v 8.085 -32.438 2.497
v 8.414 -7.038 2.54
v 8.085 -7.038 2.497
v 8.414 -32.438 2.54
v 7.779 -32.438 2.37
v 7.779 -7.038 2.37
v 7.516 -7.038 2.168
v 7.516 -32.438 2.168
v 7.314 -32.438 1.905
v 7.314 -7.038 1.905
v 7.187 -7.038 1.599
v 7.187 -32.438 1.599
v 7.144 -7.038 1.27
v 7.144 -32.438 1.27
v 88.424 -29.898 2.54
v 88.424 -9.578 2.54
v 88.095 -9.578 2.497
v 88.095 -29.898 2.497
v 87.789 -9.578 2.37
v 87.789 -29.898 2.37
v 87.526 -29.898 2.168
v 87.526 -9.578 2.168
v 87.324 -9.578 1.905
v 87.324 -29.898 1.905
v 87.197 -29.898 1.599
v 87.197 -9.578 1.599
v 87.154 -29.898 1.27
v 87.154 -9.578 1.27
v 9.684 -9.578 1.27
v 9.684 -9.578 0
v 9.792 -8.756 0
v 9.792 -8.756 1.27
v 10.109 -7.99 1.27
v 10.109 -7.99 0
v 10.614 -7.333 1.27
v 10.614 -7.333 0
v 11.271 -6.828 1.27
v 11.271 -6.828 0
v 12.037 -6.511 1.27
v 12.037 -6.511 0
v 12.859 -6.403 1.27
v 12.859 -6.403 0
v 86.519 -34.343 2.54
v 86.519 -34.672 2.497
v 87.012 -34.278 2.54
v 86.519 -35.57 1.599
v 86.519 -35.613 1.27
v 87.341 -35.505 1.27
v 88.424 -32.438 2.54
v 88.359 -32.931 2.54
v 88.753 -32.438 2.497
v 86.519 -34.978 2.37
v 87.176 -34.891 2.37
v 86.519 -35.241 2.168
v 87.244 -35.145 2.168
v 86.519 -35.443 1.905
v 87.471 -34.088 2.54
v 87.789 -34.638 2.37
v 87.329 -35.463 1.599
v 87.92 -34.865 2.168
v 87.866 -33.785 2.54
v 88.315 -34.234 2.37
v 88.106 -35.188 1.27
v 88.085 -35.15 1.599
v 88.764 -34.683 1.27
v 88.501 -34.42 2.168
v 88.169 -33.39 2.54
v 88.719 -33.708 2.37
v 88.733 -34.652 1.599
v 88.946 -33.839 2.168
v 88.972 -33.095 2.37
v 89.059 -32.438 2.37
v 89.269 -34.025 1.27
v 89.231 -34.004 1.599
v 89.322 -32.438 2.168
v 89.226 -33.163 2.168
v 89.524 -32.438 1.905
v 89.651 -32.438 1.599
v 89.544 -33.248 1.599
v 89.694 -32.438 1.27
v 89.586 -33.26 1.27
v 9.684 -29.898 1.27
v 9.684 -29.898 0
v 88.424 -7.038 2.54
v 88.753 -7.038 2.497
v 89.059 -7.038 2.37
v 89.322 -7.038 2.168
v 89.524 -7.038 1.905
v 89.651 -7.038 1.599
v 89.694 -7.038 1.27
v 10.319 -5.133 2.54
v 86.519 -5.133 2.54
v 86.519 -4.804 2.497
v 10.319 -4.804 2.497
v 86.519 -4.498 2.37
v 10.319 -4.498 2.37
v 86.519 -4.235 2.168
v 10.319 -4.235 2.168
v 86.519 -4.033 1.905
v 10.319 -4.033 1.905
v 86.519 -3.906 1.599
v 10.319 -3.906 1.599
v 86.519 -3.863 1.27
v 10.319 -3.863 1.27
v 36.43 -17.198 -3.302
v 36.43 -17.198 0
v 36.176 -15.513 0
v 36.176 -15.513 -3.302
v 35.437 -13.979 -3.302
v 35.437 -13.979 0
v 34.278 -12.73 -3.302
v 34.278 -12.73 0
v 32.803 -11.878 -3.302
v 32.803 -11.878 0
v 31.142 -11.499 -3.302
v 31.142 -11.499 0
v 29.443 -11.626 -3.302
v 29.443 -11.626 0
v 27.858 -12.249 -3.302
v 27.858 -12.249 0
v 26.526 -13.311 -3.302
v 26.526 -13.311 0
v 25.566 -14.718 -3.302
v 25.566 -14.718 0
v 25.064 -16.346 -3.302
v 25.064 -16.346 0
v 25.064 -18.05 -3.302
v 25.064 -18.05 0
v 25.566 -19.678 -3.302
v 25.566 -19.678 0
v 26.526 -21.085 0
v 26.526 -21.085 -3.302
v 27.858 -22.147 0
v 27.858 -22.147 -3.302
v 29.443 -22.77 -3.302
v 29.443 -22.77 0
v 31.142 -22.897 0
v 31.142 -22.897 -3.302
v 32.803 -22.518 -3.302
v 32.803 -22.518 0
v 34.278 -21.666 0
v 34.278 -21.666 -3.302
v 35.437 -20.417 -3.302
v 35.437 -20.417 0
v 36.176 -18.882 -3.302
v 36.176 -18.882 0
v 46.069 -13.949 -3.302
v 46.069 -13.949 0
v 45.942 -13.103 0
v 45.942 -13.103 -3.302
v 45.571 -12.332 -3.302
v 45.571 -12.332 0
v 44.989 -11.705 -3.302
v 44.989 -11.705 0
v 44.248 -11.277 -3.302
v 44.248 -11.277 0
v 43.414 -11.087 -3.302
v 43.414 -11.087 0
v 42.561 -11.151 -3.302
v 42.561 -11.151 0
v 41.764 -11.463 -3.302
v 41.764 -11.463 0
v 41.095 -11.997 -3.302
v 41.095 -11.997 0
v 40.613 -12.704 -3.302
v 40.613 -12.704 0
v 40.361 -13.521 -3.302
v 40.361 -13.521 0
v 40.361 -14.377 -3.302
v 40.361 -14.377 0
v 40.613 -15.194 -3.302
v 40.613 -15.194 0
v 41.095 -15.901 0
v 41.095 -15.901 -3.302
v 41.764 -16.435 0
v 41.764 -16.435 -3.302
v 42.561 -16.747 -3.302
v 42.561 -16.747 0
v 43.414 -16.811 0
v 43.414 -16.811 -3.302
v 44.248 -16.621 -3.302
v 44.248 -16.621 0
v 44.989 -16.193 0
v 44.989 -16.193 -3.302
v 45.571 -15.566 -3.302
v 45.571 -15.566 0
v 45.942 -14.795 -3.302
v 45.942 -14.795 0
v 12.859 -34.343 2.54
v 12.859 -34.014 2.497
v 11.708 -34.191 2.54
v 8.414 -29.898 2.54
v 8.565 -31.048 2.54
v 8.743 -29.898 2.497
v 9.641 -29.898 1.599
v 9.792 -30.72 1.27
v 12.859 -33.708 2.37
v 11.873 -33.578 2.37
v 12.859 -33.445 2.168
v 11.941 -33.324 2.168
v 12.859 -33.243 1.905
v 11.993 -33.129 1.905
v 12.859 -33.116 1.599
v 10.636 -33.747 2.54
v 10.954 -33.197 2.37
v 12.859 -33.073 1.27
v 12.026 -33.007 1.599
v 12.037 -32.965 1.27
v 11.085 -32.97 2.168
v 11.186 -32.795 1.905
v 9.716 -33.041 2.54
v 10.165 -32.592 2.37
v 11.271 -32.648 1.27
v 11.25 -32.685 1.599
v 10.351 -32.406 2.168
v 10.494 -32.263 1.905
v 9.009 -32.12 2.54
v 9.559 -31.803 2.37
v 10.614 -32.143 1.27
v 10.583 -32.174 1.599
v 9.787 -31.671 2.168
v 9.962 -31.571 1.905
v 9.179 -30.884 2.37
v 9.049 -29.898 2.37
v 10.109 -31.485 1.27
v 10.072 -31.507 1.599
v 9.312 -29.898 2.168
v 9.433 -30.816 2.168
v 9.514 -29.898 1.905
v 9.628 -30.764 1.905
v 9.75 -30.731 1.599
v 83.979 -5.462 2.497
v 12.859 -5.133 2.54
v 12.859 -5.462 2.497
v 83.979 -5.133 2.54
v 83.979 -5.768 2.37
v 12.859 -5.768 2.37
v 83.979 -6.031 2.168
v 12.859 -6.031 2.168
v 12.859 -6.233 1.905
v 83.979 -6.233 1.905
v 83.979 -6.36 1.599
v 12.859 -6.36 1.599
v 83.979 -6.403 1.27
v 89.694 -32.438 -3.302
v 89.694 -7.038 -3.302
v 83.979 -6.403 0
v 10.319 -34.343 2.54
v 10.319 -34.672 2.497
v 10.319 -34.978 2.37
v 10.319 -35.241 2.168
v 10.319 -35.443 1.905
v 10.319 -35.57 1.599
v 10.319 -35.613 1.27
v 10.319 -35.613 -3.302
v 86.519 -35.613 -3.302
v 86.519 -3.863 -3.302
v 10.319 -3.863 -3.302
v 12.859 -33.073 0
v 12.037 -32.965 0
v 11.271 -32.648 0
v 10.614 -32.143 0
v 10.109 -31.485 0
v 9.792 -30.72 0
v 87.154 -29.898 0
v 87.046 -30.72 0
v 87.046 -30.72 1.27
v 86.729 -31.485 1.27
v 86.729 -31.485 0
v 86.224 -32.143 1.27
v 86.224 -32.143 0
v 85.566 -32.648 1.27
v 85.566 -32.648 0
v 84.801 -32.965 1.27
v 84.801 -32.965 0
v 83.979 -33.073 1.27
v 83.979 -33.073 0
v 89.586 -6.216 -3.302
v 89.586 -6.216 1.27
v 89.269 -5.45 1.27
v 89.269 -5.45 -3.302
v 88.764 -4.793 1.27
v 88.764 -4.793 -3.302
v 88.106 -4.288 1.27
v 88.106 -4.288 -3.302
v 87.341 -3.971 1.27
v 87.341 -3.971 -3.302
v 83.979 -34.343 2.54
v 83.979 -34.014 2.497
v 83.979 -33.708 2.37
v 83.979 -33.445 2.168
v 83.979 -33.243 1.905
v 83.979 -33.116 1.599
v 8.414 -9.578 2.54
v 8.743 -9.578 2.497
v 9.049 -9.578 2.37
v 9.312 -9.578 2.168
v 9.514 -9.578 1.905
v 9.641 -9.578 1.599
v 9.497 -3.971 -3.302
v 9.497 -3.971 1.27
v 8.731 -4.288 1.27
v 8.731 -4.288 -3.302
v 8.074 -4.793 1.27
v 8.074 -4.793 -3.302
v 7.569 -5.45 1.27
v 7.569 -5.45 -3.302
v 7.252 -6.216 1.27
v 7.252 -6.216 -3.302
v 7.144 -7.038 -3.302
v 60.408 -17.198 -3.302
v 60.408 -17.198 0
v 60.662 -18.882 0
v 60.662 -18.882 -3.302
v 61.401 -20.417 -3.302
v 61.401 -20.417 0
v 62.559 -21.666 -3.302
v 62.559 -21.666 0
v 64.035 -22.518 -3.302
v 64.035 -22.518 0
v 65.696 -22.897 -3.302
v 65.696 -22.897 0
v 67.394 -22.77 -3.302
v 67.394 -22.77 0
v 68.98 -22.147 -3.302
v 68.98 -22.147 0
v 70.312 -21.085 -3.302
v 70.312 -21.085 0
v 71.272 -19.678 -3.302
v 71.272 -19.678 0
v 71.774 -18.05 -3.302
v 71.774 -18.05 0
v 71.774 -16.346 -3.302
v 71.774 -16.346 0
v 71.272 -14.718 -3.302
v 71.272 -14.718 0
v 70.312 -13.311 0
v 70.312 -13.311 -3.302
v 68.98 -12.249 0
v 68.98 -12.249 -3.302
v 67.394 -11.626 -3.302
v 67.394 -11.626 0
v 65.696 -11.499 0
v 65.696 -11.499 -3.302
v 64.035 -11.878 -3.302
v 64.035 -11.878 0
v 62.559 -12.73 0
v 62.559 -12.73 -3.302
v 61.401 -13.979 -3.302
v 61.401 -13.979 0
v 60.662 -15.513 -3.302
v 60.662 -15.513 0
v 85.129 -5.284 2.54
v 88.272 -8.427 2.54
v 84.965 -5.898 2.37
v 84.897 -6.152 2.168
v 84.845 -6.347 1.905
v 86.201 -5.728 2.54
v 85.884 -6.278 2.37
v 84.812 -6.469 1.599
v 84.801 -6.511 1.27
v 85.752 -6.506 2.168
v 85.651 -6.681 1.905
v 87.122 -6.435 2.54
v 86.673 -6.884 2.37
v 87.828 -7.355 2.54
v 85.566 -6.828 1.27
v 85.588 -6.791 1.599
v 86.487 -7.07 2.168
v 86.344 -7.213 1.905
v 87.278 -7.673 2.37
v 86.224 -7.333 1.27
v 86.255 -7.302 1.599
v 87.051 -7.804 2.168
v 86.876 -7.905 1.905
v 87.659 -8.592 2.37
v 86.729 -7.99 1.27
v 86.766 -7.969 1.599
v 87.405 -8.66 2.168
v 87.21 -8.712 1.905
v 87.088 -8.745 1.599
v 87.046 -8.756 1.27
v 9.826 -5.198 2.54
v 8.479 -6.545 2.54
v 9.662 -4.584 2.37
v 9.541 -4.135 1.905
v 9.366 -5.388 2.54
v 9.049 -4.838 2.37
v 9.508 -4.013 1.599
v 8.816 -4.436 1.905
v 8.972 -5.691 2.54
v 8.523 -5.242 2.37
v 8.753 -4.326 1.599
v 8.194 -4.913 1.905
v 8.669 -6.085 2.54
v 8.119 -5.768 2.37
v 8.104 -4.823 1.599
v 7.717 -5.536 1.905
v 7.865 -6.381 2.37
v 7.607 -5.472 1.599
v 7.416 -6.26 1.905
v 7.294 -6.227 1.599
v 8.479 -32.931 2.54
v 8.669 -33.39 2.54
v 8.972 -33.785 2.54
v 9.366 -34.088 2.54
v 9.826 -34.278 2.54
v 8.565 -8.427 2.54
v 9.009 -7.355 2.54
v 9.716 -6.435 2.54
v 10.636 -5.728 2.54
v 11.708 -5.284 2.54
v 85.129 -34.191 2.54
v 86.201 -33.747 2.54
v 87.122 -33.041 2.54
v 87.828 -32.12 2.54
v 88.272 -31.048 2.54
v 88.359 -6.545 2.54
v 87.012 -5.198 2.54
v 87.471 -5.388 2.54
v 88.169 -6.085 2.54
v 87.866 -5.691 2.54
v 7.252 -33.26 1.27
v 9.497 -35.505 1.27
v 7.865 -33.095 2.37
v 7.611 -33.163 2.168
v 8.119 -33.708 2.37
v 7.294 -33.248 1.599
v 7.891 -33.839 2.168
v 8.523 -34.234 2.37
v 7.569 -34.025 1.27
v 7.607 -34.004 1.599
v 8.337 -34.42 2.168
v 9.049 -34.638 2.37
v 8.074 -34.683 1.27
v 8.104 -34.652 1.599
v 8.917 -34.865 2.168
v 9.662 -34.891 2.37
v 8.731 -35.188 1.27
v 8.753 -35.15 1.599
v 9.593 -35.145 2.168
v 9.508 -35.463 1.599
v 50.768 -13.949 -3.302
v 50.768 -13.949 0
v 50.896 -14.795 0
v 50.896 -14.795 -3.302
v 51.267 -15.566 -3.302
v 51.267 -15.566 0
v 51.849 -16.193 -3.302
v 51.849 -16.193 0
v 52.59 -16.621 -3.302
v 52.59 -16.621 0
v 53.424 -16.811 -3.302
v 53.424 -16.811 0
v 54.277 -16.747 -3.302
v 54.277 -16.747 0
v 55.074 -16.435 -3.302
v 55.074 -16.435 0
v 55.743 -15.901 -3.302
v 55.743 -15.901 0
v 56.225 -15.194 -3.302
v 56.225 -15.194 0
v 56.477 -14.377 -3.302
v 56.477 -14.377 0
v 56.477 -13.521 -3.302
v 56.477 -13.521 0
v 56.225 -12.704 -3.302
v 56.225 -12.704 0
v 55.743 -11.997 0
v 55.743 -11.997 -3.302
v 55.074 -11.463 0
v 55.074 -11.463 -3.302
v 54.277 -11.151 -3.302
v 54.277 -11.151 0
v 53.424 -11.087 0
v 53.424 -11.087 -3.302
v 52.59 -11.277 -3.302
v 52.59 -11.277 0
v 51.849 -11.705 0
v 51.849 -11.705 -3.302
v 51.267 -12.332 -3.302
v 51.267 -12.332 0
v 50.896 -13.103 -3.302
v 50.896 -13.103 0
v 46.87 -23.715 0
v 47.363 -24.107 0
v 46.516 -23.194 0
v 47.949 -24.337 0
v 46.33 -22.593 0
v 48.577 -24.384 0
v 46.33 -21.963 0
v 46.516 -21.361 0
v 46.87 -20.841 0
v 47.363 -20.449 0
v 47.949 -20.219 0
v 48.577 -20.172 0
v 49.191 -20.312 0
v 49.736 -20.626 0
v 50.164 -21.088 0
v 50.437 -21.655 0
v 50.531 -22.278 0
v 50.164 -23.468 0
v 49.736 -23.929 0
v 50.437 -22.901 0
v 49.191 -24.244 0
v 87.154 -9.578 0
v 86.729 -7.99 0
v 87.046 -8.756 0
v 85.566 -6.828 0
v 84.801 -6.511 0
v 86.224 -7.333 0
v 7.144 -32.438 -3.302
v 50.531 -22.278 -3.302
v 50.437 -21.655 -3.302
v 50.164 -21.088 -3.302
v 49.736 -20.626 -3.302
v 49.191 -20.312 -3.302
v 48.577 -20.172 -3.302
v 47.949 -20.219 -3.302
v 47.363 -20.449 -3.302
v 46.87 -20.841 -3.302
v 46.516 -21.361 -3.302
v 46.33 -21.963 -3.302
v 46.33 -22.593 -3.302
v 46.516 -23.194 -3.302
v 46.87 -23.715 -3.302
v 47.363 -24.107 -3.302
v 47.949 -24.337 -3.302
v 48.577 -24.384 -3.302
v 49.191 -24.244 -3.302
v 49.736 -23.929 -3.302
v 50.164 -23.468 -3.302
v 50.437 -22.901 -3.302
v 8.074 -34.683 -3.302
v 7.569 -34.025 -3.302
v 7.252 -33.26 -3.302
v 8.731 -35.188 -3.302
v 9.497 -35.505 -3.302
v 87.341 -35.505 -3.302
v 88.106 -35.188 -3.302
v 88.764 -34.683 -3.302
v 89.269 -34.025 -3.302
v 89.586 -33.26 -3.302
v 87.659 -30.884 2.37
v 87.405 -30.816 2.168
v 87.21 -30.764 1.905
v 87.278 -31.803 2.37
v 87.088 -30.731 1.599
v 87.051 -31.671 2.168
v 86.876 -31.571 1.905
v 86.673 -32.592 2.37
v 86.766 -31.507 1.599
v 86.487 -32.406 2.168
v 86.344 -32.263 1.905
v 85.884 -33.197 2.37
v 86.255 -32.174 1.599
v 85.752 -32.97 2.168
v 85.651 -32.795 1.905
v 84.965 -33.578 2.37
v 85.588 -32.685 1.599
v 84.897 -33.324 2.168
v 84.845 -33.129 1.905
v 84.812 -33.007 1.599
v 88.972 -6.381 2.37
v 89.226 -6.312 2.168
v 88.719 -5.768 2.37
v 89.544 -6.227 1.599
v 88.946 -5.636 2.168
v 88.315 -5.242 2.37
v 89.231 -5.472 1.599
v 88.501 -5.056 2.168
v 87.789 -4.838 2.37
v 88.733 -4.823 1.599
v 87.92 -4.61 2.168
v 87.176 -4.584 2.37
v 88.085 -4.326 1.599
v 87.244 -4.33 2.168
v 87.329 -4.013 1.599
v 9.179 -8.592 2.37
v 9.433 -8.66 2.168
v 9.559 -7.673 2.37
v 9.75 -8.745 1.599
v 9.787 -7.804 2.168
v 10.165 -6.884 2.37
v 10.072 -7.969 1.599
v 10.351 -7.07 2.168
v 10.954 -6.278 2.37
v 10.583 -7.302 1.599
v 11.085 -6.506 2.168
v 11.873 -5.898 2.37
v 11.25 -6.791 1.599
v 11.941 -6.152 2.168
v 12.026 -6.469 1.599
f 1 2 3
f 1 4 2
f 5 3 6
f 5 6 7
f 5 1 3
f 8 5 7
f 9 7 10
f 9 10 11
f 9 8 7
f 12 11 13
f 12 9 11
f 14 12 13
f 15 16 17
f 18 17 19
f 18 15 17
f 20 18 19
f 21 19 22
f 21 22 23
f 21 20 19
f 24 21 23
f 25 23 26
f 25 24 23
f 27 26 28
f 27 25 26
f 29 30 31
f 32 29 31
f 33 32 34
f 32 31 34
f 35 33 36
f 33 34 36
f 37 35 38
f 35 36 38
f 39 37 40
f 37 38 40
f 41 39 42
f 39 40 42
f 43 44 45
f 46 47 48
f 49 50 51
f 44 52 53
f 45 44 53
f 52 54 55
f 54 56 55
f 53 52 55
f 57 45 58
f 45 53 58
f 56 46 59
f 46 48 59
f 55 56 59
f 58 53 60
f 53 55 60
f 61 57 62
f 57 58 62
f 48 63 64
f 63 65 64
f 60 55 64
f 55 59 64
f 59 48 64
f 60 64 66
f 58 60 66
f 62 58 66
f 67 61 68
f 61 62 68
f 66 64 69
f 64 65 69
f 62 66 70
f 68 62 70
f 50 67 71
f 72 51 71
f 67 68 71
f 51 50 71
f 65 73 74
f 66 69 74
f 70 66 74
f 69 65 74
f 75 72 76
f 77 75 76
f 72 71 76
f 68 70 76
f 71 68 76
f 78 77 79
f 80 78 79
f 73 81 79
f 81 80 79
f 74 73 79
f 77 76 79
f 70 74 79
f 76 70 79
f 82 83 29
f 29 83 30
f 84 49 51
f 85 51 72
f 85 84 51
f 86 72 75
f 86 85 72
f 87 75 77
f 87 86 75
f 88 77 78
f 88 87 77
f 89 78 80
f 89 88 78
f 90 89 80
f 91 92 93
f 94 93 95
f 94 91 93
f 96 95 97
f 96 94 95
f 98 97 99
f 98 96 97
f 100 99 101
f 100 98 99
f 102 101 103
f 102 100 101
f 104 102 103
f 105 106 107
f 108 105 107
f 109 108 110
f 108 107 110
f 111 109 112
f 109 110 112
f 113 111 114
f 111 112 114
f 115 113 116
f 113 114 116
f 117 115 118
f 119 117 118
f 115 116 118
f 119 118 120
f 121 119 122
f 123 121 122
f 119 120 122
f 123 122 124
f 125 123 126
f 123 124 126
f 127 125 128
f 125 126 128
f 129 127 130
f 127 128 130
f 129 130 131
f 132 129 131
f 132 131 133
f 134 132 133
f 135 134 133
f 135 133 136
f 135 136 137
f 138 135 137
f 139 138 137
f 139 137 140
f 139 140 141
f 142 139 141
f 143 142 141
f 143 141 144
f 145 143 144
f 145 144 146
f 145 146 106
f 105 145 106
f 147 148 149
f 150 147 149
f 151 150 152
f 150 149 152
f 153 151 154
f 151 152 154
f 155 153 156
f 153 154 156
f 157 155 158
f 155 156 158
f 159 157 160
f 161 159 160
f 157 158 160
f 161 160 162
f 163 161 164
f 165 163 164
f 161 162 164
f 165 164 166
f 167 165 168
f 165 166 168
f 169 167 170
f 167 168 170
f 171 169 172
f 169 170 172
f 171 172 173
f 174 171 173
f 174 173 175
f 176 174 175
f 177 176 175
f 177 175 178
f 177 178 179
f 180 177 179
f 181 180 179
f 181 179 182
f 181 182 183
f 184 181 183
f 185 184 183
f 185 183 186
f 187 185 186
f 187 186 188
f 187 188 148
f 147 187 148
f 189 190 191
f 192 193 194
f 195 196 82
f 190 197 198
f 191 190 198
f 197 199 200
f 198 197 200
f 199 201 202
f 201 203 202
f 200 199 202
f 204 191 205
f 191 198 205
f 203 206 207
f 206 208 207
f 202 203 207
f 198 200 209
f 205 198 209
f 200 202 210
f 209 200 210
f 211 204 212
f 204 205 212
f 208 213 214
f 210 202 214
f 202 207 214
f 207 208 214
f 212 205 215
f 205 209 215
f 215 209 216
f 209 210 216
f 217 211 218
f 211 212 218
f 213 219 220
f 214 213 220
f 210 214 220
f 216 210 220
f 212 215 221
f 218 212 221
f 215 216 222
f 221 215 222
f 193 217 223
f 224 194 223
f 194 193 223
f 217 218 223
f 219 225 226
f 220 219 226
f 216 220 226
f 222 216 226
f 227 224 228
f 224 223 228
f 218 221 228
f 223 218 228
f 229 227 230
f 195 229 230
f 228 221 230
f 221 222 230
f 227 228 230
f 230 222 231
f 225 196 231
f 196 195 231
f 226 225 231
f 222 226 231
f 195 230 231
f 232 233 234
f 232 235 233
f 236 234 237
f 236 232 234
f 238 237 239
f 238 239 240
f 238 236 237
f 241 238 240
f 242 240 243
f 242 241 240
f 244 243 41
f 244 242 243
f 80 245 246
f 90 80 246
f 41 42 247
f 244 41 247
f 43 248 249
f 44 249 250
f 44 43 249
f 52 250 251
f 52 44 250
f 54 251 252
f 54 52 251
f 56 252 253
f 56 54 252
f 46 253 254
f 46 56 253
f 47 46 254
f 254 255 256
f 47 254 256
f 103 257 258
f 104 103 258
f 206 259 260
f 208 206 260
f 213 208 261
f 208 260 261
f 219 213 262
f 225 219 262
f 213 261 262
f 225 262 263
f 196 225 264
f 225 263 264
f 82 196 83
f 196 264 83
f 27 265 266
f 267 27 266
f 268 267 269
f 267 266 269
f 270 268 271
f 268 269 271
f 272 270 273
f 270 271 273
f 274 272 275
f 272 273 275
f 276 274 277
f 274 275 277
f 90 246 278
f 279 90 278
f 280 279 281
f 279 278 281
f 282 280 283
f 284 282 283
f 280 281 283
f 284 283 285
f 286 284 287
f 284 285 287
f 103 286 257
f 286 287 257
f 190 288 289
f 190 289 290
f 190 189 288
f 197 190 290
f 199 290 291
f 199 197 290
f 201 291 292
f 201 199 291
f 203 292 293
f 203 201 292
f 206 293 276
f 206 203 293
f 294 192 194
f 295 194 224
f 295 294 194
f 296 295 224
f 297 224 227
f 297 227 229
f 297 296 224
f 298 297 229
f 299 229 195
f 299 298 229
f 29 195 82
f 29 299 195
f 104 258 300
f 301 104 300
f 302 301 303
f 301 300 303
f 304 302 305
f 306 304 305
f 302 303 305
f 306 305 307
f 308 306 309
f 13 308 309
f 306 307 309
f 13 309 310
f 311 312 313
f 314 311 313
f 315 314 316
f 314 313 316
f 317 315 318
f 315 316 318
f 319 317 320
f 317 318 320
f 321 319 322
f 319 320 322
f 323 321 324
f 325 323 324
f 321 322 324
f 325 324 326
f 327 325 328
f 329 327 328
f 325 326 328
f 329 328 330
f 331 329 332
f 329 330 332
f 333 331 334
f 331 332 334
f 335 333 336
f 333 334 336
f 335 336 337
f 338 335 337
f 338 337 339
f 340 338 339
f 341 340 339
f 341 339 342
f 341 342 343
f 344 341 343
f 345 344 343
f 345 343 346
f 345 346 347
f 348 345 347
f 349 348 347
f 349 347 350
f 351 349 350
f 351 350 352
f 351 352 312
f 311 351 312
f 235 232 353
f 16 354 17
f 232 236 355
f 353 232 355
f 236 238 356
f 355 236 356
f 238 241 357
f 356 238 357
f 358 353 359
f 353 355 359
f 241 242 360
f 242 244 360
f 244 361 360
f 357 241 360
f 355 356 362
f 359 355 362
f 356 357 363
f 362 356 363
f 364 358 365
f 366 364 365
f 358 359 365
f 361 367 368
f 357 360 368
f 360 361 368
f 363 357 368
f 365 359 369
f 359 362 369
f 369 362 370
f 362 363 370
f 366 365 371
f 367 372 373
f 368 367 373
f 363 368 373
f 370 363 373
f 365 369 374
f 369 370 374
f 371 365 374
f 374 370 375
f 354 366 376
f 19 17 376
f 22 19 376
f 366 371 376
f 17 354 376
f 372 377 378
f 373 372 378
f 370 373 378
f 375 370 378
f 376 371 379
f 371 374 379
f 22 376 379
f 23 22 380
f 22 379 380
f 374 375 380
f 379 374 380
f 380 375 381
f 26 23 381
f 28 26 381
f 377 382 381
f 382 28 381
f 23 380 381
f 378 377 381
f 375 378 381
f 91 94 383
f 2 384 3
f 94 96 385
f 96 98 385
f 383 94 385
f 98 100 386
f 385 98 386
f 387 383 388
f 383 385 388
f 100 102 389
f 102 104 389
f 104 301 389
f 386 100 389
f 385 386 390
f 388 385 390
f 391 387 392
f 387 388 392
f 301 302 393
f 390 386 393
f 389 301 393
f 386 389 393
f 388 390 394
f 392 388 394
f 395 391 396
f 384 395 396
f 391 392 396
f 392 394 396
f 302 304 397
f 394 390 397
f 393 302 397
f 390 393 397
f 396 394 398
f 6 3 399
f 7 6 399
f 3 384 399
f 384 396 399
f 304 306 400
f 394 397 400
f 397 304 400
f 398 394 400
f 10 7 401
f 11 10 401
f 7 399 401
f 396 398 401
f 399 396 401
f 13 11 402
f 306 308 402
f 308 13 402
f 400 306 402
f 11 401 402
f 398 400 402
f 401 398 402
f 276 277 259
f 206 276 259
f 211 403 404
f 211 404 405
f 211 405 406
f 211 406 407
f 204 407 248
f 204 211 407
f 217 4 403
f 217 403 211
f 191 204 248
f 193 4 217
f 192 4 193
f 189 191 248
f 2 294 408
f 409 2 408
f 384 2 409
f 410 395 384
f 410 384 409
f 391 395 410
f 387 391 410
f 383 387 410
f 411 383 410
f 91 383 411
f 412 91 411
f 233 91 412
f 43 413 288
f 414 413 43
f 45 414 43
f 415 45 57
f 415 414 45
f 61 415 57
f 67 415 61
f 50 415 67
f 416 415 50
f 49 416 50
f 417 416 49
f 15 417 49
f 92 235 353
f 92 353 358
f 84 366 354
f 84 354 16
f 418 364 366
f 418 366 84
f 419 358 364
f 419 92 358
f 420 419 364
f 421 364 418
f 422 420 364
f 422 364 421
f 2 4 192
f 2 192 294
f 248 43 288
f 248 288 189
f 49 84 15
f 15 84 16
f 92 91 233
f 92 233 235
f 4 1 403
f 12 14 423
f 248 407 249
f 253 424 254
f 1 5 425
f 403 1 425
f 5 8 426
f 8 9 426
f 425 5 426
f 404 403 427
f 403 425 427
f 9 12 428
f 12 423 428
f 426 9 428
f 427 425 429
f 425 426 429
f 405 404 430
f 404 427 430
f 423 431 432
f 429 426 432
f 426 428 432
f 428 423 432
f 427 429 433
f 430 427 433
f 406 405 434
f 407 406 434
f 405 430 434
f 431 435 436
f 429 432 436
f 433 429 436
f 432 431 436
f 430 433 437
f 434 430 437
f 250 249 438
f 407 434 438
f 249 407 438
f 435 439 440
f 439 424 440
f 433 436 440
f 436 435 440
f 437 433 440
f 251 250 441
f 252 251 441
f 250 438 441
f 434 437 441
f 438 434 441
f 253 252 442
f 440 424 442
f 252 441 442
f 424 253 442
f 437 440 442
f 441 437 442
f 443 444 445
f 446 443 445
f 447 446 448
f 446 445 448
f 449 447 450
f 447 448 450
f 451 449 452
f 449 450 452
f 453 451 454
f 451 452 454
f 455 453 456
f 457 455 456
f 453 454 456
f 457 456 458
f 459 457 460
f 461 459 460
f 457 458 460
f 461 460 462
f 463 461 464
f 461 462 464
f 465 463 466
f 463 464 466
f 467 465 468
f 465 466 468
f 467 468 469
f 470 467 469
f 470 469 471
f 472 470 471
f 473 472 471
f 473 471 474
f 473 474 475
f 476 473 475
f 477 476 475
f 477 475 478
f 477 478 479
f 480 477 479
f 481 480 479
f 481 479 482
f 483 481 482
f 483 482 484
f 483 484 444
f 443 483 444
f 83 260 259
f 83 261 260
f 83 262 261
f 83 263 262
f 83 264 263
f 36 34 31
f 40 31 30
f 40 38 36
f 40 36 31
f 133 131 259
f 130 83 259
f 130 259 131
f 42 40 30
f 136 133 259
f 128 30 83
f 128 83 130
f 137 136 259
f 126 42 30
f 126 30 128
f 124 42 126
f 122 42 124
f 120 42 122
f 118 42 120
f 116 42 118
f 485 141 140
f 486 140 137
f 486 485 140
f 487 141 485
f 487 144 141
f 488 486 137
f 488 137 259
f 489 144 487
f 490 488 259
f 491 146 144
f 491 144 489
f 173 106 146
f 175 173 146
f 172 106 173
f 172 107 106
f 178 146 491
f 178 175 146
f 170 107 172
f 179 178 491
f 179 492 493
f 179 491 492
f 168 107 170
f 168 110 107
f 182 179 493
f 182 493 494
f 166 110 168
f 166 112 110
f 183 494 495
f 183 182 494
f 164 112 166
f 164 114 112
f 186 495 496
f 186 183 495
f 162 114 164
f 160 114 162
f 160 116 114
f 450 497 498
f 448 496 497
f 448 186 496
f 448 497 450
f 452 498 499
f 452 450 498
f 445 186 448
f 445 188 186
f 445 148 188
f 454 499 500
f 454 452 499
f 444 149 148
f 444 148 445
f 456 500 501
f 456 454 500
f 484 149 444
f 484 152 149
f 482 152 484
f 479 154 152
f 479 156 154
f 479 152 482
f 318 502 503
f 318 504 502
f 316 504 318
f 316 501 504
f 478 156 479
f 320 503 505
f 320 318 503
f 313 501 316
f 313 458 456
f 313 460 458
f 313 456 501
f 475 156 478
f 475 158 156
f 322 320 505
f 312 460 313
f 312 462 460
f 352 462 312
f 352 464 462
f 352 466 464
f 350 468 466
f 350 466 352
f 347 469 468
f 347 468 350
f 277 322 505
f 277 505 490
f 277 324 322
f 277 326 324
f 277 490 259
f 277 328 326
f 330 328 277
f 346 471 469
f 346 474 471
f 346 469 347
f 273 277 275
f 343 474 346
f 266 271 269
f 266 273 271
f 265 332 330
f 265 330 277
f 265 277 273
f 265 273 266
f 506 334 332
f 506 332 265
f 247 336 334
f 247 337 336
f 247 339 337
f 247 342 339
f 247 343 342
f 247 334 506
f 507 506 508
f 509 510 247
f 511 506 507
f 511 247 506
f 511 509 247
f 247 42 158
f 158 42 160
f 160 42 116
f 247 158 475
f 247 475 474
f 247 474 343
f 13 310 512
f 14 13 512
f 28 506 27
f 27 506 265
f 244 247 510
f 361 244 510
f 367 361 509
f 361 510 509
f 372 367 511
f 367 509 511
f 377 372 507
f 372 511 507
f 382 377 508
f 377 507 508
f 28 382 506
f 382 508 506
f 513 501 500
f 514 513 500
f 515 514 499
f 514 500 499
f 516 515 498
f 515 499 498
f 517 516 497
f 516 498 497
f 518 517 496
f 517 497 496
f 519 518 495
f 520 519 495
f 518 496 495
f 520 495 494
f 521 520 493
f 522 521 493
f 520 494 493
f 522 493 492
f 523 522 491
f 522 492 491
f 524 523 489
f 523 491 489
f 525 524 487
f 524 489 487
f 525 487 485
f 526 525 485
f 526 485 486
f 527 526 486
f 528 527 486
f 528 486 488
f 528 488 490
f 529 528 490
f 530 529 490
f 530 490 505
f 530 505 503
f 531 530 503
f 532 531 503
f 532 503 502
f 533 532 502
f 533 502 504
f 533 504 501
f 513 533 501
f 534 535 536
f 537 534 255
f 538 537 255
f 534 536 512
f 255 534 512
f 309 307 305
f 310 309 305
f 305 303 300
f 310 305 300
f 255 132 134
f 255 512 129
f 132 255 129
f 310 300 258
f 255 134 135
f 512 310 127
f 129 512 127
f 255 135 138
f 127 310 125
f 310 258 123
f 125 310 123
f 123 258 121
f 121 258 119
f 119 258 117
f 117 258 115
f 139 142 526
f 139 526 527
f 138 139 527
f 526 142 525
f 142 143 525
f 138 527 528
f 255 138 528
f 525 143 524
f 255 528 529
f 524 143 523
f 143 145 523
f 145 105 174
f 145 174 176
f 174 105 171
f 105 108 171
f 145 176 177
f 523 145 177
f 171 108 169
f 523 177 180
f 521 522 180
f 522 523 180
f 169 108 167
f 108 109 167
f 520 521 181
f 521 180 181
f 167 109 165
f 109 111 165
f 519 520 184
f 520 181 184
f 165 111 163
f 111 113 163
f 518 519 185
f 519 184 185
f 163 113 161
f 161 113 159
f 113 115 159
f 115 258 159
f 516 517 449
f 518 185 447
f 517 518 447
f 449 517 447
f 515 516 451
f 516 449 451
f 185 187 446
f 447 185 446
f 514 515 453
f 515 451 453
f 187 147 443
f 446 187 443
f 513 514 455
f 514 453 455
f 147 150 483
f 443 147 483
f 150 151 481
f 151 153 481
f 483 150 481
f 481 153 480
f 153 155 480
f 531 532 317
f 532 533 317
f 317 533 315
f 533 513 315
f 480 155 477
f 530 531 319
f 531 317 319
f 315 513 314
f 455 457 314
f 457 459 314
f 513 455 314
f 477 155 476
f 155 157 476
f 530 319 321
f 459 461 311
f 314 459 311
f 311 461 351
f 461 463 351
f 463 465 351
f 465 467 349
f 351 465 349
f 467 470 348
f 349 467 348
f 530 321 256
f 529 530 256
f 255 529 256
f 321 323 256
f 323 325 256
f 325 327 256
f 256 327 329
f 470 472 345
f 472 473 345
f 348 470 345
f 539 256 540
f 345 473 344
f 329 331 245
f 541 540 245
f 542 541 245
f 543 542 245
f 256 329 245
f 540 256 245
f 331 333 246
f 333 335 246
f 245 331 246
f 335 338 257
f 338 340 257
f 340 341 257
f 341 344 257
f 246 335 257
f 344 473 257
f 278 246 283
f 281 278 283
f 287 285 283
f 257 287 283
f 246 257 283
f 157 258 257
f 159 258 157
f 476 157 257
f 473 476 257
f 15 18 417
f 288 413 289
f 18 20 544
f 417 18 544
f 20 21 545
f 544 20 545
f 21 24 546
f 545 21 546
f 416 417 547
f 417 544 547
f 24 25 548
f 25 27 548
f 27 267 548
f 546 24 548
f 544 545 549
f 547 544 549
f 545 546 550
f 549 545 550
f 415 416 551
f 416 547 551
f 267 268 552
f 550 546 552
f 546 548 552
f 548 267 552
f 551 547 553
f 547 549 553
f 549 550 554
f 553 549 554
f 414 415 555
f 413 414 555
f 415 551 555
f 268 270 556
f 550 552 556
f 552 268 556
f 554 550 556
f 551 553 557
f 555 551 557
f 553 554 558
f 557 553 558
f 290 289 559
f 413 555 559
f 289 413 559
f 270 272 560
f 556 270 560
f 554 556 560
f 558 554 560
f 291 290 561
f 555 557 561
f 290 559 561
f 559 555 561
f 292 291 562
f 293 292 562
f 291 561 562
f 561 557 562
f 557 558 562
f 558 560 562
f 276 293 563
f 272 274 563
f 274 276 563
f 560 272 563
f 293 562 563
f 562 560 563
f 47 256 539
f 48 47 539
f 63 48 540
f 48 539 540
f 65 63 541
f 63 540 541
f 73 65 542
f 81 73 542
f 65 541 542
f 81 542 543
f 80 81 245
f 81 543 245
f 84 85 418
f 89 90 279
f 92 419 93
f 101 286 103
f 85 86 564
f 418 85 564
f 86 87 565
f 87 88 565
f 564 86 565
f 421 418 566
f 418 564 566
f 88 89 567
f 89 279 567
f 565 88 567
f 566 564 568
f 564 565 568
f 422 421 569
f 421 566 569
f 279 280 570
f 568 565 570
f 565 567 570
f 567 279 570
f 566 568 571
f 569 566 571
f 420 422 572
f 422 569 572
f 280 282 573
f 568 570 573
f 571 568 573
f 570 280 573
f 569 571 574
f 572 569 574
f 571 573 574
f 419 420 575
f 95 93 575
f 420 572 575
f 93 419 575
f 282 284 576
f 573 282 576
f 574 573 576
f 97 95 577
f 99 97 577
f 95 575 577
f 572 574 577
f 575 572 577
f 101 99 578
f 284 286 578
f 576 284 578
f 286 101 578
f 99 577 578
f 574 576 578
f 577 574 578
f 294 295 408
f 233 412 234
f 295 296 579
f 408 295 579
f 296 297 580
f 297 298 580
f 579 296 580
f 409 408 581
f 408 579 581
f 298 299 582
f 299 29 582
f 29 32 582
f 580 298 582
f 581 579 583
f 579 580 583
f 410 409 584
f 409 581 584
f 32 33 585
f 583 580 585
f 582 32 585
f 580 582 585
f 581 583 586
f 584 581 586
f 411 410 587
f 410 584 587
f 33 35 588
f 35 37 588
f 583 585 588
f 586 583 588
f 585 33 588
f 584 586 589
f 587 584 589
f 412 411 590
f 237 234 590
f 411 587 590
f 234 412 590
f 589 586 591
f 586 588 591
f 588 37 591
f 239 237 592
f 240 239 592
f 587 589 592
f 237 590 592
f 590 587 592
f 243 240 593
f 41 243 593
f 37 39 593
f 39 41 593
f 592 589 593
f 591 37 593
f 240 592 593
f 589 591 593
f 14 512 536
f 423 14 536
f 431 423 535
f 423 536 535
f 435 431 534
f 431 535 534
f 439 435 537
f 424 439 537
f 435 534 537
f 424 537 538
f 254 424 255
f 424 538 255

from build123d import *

# Parameters (mm, degrees)
F1_DEPTH = 3.302
F2_DEPTH = 2.54
F3_R     = 5.715
F3_R_2   = 2.8702
F3_R_3   = 2.1123361497
F4_DEPTH = 3.303
F5_R     = 1.26999


# Not quite as in the source:
# - a fillet or chamfer is up to 0.001 mm smaller than in the source, because OpenCascade refuses the exact size


with BuildPart() as f1:
    # F0 (on Top) → F1 (new body)
    with BuildSketch(Plane.XY):
        with BuildLine():
            Line((86.5189202702, -3.8629329861), (10.3189202702, -3.8629329861))
            ThreePointArc((10.3189202702, -3.8629329861), (8.0738562399, -4.7928689558), (7.1439202702, -7.0379329861))
            Line((7.1439202702, -7.0379329861), (7.1439202702, -32.4379329861))
            ThreePointArc((7.1439202702, -32.4379329861), (8.0738562399, -34.6829970164), (10.3189202702, -35.6129329861))
            Line((10.3189202702, -35.6129329861), (86.5189202702, -35.6129329861))
            ThreePointArc((86.5189202702, -35.6129329861), (88.7639843005, -34.6829970164), (89.6939202702, -32.4379329861))
            Line((89.6939202702, -32.4379329861), (89.6939202702, -7.0379329861))
            ThreePointArc((89.6939202702, -7.0379329861), (88.7639843005, -4.7928689558), (86.5189202702, -3.8629329861))
        make_face()
        with BuildLine():
            Line((83.9789202702, -33.0729329861), (12.8589202702, -33.0729329861))
            ThreePointArc((12.8589202702, -33.0729329861), (10.6138562399, -32.1429970164), (9.6839202702, -29.8979329861))
            Line((9.6839202702, -29.8979329861), (9.6839202702, -9.5779329861))
            ThreePointArc((9.6839202702, -9.5779329861), (10.6138562399, -7.3328689558), (12.8589202702, -6.4029329861))
            Line((12.8589202702, -6.4029329861), (83.9789202702, -6.4029329861))
            ThreePointArc((83.9789202702, -6.4029329861), (86.2239843005, -7.3328689558), (87.1539202702, -9.5779329861))
            Line((87.1539202702, -9.5779329861), (87.1539202702, -29.8979329861))
            ThreePointArc((87.1539202702, -29.8979329861), (86.2239843005, -32.1429970164), (83.9789202702, -33.0729329861))
        make_face(mode=Mode.SUBTRACT)
        with BuildLine():
            ThreePointArc((9.6839202702, -29.8979329861), (10.6138562399, -32.1429970164), (12.8589202702, -33.0729329861))
            Line((12.8589202702, -33.0729329861), (83.9789202702, -33.0729329861))
            ThreePointArc((83.9789202702, -33.0729329861), (86.2239843005, -32.1429970164), (87.1539202702, -29.8979329861))
            Line((87.1539202702, -29.8979329861), (87.1539202702, -9.5779329861))
            ThreePointArc((87.1539202702, -9.5779329861), (86.2239843005, -7.3328689558), (83.9789202702, -6.4029329861))
            Line((83.9789202702, -6.4029329861), (12.8589202702, -6.4029329861))
            ThreePointArc((12.8589202702, -6.4029329861), (10.6138562399, -7.3328689558), (9.6839202702, -9.5779329861))
            Line((9.6839202702, -9.5779329861), (9.6839202702, -29.8979329861))
        make_face()
    extrude(amount=-F1_DEPTH)

    # F0 (on Top) → F2 (join)
    with BuildSketch(Plane.XY):
        with BuildLine():
            Line((86.5189202702, -3.8629329861), (10.3189202702, -3.8629329861))
            ThreePointArc((10.3189202702, -3.8629329861), (8.0738562399, -4.7928689558), (7.1439202702, -7.0379329861))
            Line((7.1439202702, -7.0379329861), (7.1439202702, -32.4379329861))
            ThreePointArc((7.1439202702, -32.4379329861), (8.0738562399, -34.6829970164), (10.3189202702, -35.6129329861))
            Line((10.3189202702, -35.6129329861), (86.5189202702, -35.6129329861))
            ThreePointArc((86.5189202702, -35.6129329861), (88.7639843005, -34.6829970164), (89.6939202702, -32.4379329861))
            Line((89.6939202702, -32.4379329861), (89.6939202702, -7.0379329861))
            ThreePointArc((89.6939202702, -7.0379329861), (88.7639843005, -4.7928689558), (86.5189202702, -3.8629329861))
        make_face()
        with BuildLine():
            Line((83.9789202702, -33.0729329861), (12.8589202702, -33.0729329861))
            ThreePointArc((12.8589202702, -33.0729329861), (10.6138562399, -32.1429970164), (9.6839202702, -29.8979329861))
            Line((9.6839202702, -29.8979329861), (9.6839202702, -9.5779329861))
            ThreePointArc((9.6839202702, -9.5779329861), (10.6138562399, -7.3328689558), (12.8589202702, -6.4029329861))
            Line((12.8589202702, -6.4029329861), (83.9789202702, -6.4029329861))
            ThreePointArc((83.9789202702, -6.4029329861), (86.2239843005, -7.3328689558), (87.1539202702, -9.5779329861))
            Line((87.1539202702, -9.5779329861), (87.1539202702, -29.8979329861))
            ThreePointArc((87.1539202702, -29.8979329861), (86.2239843005, -32.1429970164), (83.9789202702, -33.0729329861))
        make_face(mode=Mode.SUBTRACT)
    extrude(amount=F2_DEPTH)

    # F3 (on Top) → F4 (cut, through all)
    with BuildSketch(Plane.XY):
        with Locations((30.7151202702, -17.1979329861)):
            Circle(F3_R)
        with BuildLine():
            ThreePointArc((71.8377202702, -17.1979329861), (66.1227202702, -11.4829329861), (60.4077202702, -17.1979329861))
            ThreePointArc((60.4077202702, -17.1979329861), (66.1227202702, -22.9129329861), (71.8377202702, -17.1979329861))
        make_face()
        with Locations((43.1992202702, -13.949079439)):
            Circle(F3_R_2)
        with BuildLine():
            ThreePointArc((56.5088202702, -13.949079439), (53.6386202702, -11.078879439), (50.7684202702, -13.949079439))
            ThreePointArc((50.7684202702, -13.949079439), (53.6386202702, -16.819279439), (56.5088202702, -13.949079439))
        make_face()
        with Locations((48.4189202702, -22.2779329861)):
            Circle(F3_R_3)
    extrude(amount=-F4_DEPTH, mode=Mode.SUBTRACT)

    # F5 (radius 1.27 in the source; OpenCascade refuses exactly that, so slightly less here)
    f5_edges = [f1.edges().sort_by_distance(p)[0] for p in [
        (48.41892, -6.402933, 2.54),
        (10.613856, -7.332869, 2.54),
        (9.68392, -19.737933, 2.54),
        (10.613856, -32.142997, 2.54),
        (48.41892, -33.072933, 2.54),
        (87.15392, -19.737933, 2.54),
        (86.223984, -7.332869, 2.54),
        (86.223984, -32.142997, 2.54),
        (7.14392, -19.737933, 2.54),
        (8.073856, -4.792869, 2.54),
    ]]
    fillet(f5_edges, radius=F5_R)


solid = f1.part
